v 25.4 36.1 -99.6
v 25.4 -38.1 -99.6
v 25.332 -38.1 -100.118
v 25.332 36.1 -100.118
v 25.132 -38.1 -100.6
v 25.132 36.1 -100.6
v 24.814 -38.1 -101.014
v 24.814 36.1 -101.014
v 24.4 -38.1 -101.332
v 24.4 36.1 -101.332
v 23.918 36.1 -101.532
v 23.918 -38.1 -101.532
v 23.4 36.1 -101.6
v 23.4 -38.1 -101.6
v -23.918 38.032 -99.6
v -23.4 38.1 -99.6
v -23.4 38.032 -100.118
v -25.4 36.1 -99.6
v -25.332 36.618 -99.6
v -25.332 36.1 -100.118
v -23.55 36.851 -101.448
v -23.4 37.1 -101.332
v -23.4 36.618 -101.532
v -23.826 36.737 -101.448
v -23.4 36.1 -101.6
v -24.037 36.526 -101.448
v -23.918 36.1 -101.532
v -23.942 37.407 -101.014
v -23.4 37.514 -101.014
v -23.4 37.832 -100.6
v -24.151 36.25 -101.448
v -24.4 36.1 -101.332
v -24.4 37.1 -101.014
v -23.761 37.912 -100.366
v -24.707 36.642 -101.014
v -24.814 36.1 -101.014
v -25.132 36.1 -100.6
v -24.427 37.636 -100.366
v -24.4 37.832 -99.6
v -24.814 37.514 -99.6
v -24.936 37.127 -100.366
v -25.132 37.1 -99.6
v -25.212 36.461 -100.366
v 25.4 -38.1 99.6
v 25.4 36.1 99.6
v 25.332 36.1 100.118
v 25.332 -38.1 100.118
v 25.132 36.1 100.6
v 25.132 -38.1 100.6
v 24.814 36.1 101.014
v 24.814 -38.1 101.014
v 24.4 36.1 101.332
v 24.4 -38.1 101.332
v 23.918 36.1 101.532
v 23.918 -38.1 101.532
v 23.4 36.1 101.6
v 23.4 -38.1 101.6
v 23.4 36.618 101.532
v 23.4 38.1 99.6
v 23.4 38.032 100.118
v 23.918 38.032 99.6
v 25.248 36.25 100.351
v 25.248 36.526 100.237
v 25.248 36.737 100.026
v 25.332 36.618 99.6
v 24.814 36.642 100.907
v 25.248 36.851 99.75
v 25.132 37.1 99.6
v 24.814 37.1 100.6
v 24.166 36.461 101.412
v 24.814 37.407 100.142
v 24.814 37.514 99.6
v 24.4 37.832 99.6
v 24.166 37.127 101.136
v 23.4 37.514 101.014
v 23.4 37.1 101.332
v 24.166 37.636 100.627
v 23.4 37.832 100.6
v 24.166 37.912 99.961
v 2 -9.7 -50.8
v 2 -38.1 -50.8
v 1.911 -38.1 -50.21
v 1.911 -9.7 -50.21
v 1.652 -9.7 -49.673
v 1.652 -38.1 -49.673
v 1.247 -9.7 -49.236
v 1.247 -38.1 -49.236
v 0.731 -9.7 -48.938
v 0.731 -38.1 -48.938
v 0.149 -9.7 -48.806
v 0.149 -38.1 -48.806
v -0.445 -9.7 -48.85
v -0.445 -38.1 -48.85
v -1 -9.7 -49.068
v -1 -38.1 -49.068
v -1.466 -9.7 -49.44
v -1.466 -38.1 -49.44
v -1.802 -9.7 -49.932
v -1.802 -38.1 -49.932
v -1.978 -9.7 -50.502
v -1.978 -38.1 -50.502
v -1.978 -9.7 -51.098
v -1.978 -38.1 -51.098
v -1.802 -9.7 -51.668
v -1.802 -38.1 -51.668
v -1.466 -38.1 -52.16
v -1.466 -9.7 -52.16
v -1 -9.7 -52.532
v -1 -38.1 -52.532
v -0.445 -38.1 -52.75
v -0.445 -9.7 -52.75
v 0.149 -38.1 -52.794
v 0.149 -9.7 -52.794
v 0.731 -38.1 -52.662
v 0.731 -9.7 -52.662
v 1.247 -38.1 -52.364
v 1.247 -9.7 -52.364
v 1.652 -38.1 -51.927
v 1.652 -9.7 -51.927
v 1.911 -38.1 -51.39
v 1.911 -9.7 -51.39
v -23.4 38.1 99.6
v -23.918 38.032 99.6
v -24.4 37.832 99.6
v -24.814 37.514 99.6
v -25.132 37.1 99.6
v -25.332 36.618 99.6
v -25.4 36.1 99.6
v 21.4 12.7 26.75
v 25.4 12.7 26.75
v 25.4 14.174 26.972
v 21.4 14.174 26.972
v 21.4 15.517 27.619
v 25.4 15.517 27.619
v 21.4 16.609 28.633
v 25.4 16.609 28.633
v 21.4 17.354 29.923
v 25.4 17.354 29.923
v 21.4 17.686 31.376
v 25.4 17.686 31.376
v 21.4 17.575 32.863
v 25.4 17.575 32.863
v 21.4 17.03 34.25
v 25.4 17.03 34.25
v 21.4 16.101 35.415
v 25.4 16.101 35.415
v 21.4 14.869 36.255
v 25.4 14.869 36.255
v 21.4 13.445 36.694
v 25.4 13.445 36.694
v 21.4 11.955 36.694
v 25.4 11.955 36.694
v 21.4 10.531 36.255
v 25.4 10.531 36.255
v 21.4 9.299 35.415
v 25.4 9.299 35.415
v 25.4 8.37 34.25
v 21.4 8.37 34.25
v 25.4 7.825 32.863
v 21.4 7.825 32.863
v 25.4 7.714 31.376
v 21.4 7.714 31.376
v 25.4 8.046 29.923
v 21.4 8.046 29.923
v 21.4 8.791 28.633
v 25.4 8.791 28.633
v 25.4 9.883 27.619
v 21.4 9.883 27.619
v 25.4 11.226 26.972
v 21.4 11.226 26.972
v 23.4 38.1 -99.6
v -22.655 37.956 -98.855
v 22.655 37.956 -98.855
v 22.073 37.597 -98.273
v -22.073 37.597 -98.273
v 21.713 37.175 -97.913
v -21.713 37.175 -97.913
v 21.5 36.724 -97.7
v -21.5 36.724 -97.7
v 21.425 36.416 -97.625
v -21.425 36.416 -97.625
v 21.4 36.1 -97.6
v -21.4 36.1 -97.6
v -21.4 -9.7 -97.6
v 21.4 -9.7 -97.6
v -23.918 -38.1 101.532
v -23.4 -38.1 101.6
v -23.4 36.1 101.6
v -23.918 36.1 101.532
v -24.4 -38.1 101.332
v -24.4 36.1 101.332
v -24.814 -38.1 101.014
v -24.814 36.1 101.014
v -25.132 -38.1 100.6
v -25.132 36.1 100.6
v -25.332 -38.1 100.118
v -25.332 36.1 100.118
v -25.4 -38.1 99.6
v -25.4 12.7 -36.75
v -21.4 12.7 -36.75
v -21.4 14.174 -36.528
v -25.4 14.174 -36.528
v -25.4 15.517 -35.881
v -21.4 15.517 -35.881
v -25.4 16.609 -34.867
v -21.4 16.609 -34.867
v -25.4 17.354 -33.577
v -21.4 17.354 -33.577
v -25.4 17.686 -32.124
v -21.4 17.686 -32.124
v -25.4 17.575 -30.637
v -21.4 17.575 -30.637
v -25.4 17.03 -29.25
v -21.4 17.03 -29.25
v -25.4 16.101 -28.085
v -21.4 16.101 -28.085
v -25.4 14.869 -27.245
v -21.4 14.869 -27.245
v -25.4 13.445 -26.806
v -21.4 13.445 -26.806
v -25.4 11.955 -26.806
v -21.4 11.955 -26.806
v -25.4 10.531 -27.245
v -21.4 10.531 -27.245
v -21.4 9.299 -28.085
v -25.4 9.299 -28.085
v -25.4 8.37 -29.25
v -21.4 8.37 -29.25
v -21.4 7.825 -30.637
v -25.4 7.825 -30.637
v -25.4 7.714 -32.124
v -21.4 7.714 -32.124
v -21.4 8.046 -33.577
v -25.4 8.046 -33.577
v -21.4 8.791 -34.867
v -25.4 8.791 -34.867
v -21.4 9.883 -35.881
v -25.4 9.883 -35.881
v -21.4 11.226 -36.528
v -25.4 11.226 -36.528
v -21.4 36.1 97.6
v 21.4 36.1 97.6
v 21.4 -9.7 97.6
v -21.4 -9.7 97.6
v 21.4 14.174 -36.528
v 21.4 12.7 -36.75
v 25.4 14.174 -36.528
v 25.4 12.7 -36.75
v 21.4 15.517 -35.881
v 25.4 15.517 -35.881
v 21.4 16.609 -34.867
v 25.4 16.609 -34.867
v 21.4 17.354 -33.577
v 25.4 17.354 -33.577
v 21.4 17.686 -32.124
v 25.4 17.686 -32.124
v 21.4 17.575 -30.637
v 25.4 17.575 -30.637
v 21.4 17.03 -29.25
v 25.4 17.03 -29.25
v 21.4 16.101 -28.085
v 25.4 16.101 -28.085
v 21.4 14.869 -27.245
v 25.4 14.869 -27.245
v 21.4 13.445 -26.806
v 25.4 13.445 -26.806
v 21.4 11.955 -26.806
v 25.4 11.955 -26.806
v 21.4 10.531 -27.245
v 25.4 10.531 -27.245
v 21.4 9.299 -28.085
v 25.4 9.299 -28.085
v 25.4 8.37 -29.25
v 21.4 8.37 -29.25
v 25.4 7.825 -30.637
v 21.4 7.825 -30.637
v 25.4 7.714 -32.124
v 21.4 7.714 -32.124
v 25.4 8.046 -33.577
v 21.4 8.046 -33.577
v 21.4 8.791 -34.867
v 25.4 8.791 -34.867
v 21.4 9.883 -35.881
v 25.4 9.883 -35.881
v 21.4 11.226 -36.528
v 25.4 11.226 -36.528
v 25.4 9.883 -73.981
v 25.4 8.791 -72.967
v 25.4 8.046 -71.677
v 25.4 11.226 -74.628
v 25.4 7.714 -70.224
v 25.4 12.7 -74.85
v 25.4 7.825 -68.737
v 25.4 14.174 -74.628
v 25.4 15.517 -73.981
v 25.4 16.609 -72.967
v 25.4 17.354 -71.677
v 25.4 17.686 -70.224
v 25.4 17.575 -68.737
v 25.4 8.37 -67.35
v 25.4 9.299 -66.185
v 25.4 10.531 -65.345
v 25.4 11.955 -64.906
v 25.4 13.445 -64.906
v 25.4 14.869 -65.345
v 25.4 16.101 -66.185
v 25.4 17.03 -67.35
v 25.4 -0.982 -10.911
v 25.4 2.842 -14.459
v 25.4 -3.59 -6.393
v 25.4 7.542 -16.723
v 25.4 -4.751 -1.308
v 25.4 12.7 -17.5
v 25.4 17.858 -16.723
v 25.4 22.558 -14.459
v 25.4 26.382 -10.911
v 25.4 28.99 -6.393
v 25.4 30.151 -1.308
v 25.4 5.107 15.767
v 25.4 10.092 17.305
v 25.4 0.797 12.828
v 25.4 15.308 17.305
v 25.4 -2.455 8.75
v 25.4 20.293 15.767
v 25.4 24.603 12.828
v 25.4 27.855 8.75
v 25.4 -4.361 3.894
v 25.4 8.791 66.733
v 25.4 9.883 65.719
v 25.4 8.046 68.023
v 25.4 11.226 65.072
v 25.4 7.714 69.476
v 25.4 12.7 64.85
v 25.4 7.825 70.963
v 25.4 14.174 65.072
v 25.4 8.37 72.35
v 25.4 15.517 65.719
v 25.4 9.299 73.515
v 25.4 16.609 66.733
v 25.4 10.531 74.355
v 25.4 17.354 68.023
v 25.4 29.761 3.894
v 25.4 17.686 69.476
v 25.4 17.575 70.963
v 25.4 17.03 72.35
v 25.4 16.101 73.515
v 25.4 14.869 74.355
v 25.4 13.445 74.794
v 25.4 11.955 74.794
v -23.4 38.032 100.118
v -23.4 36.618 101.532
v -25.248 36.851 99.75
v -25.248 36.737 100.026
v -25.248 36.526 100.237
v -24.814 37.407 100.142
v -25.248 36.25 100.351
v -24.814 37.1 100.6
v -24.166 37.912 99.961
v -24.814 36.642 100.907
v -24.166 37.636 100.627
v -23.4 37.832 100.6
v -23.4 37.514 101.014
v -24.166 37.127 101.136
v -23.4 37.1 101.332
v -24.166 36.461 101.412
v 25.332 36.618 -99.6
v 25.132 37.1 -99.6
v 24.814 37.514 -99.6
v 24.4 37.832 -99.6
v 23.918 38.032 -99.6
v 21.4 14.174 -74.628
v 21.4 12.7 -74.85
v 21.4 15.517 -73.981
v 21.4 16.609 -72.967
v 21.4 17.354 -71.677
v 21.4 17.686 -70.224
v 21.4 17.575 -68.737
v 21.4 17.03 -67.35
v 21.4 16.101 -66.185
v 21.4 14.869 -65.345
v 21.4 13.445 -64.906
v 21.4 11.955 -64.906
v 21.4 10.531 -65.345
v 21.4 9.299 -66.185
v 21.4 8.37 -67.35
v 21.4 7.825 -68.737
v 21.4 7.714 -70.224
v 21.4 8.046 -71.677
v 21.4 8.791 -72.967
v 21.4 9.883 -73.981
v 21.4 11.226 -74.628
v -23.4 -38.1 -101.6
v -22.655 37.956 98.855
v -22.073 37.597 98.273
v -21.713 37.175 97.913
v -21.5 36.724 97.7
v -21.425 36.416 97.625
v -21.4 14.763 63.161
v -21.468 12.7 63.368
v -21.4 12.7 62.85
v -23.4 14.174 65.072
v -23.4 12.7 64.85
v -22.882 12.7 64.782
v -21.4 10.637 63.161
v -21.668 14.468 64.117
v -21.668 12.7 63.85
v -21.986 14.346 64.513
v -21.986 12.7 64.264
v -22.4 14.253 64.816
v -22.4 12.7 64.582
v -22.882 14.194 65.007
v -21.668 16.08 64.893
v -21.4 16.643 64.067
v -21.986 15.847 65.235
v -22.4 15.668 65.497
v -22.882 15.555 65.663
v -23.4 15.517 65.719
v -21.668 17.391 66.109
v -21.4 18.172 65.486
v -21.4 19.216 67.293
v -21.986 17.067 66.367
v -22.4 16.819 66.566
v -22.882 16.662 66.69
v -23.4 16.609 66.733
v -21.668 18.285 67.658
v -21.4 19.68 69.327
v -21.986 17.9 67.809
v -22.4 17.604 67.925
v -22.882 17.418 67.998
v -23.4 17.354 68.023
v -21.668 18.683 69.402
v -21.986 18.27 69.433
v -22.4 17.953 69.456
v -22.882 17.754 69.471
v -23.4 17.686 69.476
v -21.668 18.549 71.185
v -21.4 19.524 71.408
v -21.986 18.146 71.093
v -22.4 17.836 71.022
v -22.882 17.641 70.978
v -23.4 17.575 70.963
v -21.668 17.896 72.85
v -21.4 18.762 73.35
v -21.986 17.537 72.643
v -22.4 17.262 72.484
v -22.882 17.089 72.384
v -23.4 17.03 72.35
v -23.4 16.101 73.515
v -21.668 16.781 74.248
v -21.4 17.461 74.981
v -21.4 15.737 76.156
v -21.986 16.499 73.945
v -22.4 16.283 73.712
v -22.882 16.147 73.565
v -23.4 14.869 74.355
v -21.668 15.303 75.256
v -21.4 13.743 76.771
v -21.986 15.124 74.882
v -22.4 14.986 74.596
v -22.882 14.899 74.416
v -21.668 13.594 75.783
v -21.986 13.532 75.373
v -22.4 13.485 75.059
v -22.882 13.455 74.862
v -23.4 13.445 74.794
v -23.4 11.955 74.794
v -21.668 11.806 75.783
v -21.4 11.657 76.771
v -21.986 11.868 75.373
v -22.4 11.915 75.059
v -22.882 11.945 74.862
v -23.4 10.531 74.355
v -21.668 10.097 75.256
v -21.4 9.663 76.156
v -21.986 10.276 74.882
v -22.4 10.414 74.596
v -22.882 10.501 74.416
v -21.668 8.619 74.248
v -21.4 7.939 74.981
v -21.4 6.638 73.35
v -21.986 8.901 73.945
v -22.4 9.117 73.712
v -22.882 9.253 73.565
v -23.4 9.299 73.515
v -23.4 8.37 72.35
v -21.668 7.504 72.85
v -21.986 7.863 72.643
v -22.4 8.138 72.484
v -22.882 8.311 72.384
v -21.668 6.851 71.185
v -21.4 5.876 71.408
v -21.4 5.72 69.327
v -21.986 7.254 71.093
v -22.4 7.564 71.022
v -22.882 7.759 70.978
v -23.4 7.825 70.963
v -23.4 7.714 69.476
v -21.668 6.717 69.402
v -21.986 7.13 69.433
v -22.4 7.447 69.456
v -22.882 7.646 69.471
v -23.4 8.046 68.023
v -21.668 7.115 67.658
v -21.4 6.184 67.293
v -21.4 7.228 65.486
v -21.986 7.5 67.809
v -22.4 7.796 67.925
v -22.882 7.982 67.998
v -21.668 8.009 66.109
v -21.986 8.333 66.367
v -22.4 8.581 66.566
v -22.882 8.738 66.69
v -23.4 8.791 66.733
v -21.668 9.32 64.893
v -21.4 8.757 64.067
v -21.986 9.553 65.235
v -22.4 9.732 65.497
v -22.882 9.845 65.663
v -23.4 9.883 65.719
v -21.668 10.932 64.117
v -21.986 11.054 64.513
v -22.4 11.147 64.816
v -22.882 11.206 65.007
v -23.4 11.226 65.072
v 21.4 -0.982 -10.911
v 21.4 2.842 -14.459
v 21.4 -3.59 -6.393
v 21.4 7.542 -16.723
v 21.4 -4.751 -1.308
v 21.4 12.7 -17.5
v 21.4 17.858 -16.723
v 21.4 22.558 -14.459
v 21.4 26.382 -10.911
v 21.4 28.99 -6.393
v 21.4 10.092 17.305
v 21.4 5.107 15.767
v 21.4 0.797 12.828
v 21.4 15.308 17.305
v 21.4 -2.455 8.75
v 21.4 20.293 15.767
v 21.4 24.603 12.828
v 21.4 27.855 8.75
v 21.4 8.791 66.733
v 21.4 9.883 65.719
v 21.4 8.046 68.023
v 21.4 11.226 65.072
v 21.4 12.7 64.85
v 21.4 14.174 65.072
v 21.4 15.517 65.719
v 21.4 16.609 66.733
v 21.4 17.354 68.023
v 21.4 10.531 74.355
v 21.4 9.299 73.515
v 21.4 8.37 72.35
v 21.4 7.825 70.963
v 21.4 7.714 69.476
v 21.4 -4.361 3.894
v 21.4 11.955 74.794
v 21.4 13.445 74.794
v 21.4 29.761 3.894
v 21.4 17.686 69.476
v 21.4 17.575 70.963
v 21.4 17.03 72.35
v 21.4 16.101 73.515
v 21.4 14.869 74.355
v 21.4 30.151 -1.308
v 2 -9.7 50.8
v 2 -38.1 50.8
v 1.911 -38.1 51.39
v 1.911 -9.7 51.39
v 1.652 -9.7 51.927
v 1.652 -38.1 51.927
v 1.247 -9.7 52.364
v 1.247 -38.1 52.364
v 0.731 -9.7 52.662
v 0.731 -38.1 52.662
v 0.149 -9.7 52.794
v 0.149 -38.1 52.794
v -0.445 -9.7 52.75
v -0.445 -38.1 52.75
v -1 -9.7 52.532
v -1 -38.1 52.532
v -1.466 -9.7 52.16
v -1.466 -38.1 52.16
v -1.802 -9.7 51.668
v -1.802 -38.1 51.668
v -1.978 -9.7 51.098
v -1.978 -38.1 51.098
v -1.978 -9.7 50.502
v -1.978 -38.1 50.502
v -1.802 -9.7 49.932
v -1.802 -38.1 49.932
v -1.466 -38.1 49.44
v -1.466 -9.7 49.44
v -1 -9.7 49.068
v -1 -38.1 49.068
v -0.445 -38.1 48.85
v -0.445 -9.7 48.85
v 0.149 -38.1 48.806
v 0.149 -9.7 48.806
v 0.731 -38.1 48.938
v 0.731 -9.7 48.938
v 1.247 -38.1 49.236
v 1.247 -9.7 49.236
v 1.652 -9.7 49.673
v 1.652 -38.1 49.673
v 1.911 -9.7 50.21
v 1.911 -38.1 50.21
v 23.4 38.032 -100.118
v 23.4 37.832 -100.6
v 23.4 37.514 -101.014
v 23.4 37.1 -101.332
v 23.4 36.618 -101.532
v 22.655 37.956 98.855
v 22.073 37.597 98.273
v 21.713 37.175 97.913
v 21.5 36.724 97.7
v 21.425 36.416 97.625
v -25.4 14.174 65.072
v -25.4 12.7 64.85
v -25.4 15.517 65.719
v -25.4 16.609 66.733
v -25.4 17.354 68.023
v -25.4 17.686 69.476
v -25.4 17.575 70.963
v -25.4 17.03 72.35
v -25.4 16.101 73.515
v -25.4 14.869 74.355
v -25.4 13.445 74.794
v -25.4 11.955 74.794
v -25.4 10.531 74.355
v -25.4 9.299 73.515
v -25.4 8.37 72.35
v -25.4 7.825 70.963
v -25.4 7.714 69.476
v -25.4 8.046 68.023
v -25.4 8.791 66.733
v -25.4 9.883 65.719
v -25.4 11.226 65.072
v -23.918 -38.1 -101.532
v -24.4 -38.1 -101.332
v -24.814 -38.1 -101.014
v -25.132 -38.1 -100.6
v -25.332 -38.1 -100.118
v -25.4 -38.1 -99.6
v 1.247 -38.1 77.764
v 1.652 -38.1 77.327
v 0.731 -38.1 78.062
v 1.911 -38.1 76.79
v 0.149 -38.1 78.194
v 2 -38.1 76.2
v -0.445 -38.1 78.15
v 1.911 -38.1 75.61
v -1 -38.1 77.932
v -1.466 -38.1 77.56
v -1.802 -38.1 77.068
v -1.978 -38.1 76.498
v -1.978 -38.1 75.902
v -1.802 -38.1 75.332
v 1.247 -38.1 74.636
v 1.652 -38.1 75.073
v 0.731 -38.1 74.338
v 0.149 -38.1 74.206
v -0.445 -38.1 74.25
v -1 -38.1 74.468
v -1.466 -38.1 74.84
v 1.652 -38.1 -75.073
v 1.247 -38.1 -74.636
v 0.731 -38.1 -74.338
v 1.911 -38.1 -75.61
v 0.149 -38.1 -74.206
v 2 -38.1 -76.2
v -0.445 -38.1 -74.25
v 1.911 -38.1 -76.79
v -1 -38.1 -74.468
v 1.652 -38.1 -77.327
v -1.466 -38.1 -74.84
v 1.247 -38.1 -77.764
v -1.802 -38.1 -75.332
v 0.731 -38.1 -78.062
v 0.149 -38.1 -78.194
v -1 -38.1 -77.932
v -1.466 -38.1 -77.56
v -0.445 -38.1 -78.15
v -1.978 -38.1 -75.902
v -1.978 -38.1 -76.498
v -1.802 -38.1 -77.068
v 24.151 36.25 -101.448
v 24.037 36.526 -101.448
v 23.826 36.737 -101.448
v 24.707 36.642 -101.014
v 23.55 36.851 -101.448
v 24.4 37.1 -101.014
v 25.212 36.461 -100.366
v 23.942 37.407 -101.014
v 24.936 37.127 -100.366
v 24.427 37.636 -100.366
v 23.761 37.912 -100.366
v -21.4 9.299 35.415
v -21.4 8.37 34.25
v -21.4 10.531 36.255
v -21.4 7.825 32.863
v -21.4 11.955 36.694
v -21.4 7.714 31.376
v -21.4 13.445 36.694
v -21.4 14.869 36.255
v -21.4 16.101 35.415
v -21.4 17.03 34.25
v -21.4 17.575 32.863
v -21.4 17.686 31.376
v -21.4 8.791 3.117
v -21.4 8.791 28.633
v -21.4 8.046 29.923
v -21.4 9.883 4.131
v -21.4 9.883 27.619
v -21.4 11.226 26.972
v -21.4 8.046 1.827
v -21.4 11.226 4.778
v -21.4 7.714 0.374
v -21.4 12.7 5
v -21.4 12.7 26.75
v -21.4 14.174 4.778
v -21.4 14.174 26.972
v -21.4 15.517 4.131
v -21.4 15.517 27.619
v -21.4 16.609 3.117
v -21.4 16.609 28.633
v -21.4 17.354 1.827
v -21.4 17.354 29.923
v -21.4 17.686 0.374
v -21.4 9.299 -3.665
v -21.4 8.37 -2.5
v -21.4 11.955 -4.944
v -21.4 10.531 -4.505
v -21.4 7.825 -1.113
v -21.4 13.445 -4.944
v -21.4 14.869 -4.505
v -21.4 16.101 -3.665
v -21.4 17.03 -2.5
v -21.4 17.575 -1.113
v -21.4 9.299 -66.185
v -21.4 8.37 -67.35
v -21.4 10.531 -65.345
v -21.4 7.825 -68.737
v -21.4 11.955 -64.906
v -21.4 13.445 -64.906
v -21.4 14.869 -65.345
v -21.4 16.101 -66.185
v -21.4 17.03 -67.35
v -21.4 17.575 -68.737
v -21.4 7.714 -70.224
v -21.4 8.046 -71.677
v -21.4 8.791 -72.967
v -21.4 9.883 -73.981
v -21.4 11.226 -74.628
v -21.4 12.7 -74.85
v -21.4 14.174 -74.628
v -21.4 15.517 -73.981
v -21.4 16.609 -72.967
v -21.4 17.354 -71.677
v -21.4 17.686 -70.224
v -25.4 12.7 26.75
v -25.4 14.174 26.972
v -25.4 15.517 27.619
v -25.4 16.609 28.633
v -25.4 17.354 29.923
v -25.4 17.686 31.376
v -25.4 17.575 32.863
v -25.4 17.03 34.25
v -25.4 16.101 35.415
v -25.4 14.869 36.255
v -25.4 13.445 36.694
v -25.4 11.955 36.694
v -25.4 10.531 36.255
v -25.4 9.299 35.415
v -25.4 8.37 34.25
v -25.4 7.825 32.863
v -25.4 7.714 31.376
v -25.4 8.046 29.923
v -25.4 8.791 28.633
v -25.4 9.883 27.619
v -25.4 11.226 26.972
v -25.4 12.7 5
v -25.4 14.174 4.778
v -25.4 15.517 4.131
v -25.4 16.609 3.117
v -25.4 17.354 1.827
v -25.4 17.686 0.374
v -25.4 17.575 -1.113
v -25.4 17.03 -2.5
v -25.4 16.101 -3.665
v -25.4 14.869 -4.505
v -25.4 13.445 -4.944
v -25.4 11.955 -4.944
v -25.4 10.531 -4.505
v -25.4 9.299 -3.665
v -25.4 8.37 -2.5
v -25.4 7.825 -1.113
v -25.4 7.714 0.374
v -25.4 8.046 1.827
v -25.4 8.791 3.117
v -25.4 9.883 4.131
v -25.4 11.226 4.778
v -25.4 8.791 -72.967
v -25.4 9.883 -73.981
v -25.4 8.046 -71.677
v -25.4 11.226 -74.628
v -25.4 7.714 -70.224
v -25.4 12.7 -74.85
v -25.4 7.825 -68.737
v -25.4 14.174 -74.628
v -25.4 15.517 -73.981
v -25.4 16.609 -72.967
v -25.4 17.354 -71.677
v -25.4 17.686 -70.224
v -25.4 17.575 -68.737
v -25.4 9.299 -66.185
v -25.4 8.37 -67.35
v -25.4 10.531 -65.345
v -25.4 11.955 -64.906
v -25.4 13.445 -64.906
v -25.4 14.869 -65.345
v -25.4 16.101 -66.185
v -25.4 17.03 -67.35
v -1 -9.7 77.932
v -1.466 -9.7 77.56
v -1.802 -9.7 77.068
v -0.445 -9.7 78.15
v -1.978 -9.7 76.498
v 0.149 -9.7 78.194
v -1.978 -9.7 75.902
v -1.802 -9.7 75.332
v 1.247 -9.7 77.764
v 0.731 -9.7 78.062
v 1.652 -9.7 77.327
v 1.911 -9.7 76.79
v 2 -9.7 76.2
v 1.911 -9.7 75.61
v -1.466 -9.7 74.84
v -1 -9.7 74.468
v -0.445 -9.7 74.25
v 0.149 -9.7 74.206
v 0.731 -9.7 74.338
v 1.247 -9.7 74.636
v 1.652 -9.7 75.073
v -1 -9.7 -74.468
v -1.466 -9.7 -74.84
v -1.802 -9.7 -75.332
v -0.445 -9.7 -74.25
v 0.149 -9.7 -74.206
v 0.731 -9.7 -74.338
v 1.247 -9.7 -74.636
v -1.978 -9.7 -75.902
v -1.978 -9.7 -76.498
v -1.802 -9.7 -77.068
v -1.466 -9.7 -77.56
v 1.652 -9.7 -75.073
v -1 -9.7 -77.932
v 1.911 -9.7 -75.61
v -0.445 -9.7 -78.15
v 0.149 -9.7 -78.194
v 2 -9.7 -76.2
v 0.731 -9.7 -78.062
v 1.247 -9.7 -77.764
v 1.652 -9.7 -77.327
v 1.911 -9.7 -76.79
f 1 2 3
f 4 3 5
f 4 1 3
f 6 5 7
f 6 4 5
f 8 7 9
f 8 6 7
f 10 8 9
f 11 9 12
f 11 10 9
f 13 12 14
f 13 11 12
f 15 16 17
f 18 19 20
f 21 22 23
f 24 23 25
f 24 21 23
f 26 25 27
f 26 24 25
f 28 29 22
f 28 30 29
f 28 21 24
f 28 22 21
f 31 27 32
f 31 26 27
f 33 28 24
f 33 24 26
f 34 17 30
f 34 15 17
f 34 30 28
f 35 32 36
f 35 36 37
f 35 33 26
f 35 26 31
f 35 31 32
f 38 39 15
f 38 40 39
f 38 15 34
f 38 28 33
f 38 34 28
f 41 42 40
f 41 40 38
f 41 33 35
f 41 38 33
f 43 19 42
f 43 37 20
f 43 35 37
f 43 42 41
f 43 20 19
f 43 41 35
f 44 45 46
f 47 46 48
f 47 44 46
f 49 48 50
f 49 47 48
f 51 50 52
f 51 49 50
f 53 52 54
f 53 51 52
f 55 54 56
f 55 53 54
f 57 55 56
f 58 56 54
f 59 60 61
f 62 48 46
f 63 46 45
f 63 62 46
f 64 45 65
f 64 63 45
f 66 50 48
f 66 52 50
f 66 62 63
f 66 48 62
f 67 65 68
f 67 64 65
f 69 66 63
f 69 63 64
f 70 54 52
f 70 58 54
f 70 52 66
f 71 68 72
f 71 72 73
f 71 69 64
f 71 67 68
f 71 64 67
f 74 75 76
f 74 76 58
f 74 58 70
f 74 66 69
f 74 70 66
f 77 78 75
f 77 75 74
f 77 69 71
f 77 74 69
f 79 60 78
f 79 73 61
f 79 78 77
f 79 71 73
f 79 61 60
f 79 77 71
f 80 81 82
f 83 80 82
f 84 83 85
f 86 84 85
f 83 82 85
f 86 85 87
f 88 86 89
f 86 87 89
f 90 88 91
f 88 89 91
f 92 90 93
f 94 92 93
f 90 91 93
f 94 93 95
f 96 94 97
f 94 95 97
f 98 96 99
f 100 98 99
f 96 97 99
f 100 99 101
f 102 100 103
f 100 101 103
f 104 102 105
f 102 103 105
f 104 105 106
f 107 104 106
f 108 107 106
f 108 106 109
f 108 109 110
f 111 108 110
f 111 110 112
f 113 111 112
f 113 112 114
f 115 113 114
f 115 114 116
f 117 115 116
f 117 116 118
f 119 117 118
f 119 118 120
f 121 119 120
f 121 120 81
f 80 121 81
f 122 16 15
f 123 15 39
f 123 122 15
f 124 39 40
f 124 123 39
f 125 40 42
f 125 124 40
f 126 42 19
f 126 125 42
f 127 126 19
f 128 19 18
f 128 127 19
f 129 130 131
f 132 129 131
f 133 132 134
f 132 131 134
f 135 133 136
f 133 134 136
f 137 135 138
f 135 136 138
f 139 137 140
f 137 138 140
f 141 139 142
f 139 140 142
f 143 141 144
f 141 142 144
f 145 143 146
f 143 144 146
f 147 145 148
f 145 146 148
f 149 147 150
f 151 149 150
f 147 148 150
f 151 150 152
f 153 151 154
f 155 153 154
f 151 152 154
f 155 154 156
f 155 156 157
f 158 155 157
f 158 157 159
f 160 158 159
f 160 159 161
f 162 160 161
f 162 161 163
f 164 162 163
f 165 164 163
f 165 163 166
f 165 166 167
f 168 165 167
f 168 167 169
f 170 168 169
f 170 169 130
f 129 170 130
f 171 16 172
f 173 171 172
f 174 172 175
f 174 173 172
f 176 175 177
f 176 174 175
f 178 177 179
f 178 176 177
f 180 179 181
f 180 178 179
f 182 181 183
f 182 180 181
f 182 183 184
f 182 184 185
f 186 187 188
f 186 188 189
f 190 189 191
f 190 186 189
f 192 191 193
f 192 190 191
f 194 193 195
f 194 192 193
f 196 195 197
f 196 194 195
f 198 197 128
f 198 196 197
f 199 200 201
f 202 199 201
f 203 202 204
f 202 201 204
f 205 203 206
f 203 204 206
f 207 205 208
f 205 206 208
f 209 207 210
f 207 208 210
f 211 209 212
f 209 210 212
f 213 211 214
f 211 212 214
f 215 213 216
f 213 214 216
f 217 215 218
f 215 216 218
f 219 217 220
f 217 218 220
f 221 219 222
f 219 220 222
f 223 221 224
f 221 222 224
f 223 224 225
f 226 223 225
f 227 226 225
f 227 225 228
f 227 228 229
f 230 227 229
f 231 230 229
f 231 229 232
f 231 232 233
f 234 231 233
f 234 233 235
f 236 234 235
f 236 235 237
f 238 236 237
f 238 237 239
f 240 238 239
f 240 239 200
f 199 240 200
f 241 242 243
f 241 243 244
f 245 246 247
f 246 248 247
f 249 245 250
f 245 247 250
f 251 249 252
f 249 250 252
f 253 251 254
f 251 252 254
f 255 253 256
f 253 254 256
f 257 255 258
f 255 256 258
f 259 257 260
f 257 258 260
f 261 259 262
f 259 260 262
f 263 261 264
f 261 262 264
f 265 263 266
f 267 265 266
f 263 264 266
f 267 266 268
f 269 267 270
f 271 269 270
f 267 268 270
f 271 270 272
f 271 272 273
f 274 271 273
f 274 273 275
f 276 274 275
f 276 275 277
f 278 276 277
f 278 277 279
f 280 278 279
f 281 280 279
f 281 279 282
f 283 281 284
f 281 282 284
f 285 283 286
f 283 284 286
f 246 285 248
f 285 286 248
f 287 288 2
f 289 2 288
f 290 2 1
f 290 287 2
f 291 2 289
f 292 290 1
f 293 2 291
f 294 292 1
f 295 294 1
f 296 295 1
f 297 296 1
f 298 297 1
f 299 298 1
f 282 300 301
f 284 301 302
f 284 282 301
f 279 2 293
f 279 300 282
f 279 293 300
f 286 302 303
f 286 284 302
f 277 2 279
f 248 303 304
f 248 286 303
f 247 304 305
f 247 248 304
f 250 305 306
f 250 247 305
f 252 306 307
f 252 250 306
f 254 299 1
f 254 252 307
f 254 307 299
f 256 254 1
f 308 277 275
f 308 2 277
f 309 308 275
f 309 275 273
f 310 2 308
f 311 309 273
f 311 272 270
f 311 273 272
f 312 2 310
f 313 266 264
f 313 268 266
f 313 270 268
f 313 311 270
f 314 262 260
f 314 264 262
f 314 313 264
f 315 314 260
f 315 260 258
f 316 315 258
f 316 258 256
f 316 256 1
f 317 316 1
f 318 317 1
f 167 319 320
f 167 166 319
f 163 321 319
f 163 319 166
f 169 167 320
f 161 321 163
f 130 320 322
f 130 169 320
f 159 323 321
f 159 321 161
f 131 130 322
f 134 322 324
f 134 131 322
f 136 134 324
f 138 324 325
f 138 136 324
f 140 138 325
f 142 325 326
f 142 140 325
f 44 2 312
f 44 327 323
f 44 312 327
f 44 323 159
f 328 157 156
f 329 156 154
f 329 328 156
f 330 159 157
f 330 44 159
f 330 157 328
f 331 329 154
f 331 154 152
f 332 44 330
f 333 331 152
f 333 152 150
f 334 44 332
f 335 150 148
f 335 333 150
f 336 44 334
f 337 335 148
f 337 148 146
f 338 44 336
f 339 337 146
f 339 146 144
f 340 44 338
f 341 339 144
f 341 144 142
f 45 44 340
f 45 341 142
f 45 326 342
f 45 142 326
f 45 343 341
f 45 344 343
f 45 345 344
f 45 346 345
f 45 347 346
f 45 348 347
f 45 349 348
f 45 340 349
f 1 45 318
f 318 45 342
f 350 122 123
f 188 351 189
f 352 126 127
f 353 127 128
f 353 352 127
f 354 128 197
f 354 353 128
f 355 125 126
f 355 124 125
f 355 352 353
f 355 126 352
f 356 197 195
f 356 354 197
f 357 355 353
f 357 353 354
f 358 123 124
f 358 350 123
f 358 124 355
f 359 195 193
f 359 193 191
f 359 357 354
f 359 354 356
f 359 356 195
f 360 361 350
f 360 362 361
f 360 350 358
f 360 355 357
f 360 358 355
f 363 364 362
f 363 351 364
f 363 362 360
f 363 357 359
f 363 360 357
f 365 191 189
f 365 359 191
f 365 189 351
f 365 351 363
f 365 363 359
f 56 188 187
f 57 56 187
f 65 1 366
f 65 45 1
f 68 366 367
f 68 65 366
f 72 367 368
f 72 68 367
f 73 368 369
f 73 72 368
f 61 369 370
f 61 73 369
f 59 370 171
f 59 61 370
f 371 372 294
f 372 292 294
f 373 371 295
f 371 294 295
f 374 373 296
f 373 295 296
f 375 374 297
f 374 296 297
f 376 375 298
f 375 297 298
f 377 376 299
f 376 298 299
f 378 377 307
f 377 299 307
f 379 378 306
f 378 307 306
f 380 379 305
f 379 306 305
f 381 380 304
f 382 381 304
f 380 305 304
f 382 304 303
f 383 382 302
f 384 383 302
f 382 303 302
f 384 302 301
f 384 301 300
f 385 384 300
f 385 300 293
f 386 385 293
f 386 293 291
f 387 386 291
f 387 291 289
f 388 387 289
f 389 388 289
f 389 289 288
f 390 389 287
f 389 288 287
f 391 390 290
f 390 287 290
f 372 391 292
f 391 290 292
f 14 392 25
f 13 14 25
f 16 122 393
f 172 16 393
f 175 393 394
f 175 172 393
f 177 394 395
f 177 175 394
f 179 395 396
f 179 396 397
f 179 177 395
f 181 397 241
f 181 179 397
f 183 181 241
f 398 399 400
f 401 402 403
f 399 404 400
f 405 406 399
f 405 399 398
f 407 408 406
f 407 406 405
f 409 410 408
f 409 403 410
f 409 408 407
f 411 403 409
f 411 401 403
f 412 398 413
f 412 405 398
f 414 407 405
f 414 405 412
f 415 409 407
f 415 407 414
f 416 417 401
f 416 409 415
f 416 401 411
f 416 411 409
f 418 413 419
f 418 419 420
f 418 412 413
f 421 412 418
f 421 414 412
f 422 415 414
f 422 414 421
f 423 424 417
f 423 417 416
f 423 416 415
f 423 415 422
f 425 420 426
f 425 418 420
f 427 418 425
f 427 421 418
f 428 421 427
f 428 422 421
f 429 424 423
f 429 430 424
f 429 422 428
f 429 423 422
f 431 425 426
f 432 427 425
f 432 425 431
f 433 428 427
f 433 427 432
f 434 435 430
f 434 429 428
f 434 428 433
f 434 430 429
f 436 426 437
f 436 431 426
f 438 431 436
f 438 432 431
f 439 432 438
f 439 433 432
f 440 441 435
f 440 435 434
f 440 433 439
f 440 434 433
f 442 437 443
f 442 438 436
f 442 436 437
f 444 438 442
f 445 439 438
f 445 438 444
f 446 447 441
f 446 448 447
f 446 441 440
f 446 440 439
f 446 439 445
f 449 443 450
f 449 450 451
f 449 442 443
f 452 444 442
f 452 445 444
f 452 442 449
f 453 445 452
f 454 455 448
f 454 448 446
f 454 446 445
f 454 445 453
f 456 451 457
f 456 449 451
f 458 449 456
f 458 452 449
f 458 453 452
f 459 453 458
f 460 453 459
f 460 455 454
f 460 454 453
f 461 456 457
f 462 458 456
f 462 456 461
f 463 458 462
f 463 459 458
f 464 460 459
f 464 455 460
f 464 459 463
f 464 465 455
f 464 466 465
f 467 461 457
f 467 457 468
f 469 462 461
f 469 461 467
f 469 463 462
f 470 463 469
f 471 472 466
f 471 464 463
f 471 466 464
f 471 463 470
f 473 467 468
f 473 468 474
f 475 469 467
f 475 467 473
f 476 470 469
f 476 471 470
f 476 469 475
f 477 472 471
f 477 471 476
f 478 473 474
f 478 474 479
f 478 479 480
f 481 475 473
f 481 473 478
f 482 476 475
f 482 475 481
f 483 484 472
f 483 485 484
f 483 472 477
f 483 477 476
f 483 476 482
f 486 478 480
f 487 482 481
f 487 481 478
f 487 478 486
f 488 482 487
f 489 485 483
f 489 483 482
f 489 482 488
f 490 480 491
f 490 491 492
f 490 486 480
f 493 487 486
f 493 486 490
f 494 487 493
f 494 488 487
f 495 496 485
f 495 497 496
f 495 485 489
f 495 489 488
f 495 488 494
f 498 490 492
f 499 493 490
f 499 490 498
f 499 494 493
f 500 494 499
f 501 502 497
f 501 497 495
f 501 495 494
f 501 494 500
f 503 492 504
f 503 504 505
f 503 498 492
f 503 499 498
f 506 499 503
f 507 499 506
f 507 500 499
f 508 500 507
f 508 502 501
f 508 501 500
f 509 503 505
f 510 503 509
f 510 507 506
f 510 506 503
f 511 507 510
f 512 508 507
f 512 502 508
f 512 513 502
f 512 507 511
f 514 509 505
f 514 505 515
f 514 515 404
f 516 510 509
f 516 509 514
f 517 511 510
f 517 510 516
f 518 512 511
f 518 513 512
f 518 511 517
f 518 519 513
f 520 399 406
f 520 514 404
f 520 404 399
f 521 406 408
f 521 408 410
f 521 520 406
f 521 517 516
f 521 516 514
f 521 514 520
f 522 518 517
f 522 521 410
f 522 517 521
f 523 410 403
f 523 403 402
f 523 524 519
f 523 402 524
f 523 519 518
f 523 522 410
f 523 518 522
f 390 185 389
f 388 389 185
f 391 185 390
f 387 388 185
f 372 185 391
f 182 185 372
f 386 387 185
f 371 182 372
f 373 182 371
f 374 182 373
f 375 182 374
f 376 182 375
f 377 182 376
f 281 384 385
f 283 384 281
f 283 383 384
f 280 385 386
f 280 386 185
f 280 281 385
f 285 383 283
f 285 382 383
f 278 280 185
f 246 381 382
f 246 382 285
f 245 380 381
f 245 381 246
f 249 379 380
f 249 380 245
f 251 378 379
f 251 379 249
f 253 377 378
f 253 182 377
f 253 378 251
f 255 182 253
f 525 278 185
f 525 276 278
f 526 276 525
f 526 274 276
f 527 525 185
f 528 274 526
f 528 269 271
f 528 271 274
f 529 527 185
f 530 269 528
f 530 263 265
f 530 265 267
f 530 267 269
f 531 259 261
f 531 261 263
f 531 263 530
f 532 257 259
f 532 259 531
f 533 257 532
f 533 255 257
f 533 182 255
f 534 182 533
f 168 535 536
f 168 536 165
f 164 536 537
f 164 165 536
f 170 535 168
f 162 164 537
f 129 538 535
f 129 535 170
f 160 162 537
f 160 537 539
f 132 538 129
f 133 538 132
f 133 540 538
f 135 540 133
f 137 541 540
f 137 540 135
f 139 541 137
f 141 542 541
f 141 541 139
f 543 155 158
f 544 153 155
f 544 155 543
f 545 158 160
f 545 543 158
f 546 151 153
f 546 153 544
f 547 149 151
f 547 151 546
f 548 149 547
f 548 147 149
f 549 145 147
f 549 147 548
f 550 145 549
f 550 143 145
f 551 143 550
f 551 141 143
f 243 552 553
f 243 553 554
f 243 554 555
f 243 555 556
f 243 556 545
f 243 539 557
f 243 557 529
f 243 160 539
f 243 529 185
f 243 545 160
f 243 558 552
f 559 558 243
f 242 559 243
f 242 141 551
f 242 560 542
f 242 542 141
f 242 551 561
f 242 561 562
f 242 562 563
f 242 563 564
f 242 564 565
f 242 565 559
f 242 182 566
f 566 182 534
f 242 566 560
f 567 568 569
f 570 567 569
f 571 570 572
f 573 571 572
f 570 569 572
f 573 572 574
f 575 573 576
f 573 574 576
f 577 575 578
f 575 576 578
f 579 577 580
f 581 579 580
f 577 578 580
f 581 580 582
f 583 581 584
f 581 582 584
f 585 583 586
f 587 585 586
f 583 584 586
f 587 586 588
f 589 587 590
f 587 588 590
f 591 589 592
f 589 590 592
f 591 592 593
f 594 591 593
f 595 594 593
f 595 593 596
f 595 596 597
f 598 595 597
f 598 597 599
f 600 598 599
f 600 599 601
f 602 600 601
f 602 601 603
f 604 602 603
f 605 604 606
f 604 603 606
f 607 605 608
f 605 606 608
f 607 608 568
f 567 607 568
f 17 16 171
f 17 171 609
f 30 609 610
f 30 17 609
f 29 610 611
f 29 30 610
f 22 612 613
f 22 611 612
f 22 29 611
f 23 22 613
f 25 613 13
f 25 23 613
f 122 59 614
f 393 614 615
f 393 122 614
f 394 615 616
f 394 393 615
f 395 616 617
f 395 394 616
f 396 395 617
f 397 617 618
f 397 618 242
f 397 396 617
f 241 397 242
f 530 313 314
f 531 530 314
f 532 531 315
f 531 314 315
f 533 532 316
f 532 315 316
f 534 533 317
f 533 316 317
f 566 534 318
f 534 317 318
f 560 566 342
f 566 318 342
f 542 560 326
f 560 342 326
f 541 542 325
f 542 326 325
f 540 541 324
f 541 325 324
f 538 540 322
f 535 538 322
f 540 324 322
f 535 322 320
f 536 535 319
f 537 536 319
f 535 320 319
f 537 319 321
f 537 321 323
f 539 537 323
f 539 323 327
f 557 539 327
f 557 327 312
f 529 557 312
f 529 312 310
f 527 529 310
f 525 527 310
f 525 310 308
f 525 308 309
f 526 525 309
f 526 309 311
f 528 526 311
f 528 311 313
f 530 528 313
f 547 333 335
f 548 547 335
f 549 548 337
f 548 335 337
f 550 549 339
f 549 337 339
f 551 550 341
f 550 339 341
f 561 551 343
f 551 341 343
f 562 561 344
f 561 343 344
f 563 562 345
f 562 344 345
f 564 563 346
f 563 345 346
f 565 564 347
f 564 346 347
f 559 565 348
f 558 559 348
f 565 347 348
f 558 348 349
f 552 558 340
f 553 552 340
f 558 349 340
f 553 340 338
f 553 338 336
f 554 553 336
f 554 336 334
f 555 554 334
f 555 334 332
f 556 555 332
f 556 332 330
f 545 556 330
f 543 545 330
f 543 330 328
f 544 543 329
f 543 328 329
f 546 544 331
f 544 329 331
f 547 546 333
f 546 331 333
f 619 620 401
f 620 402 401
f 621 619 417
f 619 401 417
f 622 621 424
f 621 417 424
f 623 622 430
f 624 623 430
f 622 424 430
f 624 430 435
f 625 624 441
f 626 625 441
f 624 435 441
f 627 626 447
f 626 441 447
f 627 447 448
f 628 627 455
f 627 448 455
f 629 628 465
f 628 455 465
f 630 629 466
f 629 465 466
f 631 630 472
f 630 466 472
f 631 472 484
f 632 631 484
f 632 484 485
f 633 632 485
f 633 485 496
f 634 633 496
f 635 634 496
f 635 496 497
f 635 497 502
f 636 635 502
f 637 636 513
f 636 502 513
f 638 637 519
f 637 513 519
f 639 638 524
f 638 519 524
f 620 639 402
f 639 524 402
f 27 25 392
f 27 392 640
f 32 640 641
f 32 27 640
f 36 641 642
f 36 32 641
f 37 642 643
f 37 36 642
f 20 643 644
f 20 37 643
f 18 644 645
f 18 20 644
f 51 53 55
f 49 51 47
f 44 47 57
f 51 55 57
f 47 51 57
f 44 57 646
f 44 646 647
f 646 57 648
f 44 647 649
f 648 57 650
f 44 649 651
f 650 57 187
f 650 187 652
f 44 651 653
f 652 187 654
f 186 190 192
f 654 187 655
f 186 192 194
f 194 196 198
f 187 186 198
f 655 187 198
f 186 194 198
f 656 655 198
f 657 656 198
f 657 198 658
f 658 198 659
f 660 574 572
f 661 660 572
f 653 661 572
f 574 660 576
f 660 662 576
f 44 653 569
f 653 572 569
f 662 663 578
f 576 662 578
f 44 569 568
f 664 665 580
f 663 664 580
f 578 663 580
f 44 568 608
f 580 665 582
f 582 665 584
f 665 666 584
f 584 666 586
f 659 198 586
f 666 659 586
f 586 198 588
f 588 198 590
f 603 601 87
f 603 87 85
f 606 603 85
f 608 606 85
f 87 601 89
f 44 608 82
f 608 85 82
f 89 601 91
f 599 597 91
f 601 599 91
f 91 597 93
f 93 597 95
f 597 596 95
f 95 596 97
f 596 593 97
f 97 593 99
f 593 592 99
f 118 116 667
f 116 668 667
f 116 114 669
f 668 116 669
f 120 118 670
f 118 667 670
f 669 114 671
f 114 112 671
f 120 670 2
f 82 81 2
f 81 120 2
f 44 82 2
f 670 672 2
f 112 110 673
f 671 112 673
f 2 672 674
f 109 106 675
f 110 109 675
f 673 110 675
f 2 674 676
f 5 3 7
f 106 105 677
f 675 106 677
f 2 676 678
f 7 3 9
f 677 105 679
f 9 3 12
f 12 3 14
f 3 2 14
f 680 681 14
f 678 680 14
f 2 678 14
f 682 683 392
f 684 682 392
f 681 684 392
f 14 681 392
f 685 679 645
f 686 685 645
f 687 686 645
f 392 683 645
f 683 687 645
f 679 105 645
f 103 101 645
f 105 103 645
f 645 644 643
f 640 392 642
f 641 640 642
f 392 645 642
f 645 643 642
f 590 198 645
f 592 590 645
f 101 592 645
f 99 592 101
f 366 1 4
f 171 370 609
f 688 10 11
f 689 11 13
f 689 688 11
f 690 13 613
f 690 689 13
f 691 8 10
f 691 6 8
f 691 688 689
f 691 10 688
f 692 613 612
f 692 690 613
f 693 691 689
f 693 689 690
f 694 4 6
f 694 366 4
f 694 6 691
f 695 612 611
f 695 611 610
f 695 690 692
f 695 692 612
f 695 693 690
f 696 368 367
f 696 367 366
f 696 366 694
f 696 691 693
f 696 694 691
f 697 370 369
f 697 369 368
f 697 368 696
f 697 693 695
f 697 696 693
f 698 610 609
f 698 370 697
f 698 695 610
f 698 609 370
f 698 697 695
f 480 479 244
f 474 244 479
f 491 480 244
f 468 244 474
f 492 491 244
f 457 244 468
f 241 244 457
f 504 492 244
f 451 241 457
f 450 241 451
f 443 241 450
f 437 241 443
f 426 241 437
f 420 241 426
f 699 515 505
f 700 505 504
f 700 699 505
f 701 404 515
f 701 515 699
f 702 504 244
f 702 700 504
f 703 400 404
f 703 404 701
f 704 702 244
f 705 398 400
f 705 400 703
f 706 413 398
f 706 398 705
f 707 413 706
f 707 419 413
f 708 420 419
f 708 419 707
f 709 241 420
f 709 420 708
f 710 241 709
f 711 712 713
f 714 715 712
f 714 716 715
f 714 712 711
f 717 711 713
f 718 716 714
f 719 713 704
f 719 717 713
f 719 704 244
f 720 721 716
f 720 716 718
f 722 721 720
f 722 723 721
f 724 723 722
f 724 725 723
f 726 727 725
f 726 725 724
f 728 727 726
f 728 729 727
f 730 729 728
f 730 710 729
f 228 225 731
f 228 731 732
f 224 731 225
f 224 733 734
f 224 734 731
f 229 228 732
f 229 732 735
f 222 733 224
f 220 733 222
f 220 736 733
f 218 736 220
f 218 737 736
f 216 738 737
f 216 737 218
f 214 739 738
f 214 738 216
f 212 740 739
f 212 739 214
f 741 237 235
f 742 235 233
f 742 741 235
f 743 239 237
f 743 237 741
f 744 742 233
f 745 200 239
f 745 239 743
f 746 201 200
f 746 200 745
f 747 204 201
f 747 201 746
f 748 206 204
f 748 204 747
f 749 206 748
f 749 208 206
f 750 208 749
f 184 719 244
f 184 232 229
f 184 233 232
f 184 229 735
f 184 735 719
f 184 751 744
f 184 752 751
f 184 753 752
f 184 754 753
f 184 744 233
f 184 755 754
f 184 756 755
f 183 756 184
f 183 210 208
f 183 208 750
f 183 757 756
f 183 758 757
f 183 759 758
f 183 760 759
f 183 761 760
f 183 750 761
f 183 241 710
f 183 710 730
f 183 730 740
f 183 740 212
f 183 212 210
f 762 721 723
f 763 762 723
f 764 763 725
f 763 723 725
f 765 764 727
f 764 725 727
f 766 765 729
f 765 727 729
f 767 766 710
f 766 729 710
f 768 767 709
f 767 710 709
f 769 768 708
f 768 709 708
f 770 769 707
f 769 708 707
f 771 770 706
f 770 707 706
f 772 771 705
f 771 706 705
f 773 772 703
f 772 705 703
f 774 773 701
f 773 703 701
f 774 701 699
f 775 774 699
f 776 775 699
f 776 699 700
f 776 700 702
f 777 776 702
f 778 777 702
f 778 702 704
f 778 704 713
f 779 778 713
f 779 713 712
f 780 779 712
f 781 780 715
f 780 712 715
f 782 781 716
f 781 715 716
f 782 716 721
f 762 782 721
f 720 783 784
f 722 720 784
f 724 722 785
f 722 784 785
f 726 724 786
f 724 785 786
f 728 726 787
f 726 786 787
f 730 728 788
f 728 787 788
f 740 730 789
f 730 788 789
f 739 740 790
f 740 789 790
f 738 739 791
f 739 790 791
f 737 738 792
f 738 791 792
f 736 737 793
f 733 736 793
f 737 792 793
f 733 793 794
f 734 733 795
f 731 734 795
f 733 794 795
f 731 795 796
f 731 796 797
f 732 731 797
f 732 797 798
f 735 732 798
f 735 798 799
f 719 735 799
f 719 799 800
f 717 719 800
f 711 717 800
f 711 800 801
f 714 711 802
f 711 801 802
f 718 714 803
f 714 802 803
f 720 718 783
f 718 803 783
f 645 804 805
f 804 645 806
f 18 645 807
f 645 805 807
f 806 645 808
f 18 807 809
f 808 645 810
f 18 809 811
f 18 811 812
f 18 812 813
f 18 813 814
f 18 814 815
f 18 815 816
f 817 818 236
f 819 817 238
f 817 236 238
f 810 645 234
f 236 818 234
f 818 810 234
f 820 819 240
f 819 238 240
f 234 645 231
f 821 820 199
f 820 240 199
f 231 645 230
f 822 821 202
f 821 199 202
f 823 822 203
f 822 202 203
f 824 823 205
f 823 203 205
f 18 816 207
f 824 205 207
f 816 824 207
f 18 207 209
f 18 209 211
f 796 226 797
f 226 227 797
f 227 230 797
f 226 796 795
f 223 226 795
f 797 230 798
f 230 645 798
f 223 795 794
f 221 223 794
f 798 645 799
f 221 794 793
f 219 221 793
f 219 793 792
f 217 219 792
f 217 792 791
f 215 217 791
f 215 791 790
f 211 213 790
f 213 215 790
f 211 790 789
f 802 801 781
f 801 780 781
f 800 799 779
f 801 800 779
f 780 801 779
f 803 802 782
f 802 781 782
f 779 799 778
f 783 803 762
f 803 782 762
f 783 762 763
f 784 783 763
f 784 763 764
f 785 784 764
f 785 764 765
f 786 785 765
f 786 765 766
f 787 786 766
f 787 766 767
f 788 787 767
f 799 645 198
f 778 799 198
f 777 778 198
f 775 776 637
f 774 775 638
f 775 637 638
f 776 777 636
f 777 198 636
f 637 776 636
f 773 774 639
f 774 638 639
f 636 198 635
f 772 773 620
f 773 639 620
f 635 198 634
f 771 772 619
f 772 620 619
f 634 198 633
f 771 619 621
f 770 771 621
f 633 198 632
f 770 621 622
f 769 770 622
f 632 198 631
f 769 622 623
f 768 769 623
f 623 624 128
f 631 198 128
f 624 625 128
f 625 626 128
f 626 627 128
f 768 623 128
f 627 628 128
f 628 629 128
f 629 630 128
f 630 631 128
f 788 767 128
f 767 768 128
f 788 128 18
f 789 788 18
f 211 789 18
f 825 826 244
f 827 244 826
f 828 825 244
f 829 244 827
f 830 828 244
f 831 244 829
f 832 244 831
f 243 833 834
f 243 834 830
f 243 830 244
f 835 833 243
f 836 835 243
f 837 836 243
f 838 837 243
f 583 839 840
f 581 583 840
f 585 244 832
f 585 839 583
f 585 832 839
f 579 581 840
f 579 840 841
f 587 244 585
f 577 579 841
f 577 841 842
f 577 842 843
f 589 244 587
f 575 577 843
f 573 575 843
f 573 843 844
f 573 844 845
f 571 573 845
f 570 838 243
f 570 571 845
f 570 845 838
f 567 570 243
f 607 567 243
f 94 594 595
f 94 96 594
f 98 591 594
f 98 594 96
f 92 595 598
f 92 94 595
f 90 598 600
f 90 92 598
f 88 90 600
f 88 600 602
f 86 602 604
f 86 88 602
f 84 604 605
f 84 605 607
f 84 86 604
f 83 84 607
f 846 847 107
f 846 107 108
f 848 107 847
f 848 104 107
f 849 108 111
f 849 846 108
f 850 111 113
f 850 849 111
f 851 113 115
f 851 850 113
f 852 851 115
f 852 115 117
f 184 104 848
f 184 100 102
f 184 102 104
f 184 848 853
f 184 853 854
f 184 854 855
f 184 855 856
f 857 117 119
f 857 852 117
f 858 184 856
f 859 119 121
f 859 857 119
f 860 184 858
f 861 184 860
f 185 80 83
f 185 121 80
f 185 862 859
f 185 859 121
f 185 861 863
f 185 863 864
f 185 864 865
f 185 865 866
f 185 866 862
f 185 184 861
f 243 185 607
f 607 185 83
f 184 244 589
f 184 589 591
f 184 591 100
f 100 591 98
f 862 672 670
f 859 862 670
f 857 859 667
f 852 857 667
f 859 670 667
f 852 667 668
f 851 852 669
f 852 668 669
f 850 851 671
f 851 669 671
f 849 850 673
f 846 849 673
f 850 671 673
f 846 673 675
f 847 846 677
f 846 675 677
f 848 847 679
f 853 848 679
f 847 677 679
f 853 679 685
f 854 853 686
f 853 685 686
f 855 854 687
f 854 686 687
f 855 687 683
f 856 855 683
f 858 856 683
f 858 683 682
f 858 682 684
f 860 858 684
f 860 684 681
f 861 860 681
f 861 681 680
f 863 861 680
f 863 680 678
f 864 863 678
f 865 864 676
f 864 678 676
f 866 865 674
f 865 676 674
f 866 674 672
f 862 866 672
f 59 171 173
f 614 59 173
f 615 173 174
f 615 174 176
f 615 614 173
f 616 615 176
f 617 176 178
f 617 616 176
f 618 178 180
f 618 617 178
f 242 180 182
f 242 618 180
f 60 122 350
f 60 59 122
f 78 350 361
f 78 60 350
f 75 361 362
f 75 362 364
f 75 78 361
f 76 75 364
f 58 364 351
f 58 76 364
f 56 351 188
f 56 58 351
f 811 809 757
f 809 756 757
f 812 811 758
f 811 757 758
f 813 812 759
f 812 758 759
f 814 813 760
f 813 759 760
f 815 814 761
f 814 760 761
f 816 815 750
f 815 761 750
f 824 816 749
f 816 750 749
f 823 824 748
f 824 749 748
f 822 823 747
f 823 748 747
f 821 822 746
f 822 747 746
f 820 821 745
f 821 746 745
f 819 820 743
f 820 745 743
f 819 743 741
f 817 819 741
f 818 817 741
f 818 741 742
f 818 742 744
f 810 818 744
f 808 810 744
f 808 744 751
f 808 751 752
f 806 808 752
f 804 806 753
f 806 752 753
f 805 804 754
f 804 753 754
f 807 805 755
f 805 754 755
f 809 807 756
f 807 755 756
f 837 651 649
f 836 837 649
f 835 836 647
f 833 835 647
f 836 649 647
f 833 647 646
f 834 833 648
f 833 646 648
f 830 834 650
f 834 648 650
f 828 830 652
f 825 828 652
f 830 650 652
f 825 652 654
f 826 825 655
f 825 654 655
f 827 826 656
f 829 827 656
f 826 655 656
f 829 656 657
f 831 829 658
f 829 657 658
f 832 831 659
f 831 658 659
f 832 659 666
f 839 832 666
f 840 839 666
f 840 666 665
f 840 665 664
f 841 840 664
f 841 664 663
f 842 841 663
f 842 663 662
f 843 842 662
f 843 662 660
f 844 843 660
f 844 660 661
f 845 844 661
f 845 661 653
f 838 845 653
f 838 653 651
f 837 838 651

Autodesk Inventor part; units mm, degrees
ref_plane "YZ Plane" through (0, 0, 0) normal (1, 0, 0) x (0, 1, 0)
ref_plane "XZ Plane" through (0, 0, 0) normal (0, 1, 0) x (-1, 0, 0)
ref_plane "XY Plane" through (0, 0, 0) normal (0, 0, 1) x (1, 0, 0)
sketch "Sketch1" plane through (0, 0, 0) normal (1, 0, 0) x (0, 1, 0)
  line L0 (38.1, 101.6) -> (-38.1, 101.6)
  line L1 (-38.1, 101.6) -> (-38.1, -101.6)
  line L2 (-38.1, -101.6) -> (38.1, -101.6)
  line L3 (38.1, -101.6) -> (38.1, 101.6)
  line L4 (38.1, 101.6) -> (-38.1, -101.6) construction
  line L5 (-38.1, 101.6) -> (38.1, -101.6) construction
  point P0 (0, 0)
  dimension "d0" = 76.2
  dimension "d1" = 203.2
extrude "Extrusion1" add sketch "Sketch1" along normal mid plane 50.8
sketch "Sketch2" plane through (-25.4, 38.1, 101.6) normal (0, 1, 0) x (1, 0, 0)
  line L0 (4, 199.2) -> (46.8, 199.2)
  line L1 (46.8, 199.2) -> (46.8, 4)
  line L2 (46.8, 4) -> (4, 4)
  line L3 (4, 4) -> (4, 199.2)
  line L4 (4, 199.2) -> (46.8, 4) construction
  line L5 (46.8, 199.2) -> (4, 4) construction
  line L6 (0, 0) -> (0, 203.2) projected
  line L7 (0, 0) -> (50.8, 0) projected
  point P0 (25.4, 101.6)
  dimension "d4" = 4
  dimension "d5" = 4
extrude "Extrusion2" cut sketch "Sketch2" against normal blind 47.8
sketch "Sketch5" plane through (-25.4, -38.1, -101.6) normal (0, -1, 0) x (1, 0, 0)
  circle A0 centre (25.4, 152.4) radius 2
  circle A1 centre (25.4, 177.8) radius 2
  circle A2 centre (25.4, 50.8) radius 2
  circle A3 centre (25.4, 25.4) radius 2
  line L0 (50.8, 203.2) -> (0, 203.2) projected
  line L1 (0, 0) -> (50.8, 0) projected
  line L2 (50.8, 203.2) -> (50.8, 0) projected
  point P0 (25.4, 101.6)
  dimension "d33" = 4
  dimension "d34" = 4
  dimension "d35" = 4
  dimension "d36" = 4
  dimension "d37" = 25.4
  dimension "d38" = 25.4
  dimension "d39" = 50.8
  dimension "d40" = 50.8
  dimension "d41" = 25.4
  dimension "d42" = 25.4
  dimension "d43" = 25.4
  dimension "d44" = 25.4
extrude "Extrusion5" cut sketch "Sketch5" against normal through all
sketch "Sketch6" plane through (25.4, 0, 0) normal (1, 0, 0) x (0, 0, -1)
  point P0 (0, 0)
sketch "Sketch7" plane through (25.4, 0, 0) normal (1, 0, 0) x (0, 0, -1)
  point P0 (0, 0)
sketch "Sketch8" plane through (25.4, 0, 0) normal (1, 0, 0) x (0, 0, -1)
  circle A0 centre (-69.85, 12.7) radius 5
  circle A1 centre (-31.75, 12.7) radius 5
  circle A2 centre (31.75, 12.7) radius 5
  circle A3 centre (69.85, 12.7) radius 5
  line L0 (-101.6, 38.1) -> (-101.6, -38.1)
  line L1 (101.6, -38.1) -> (101.6, 38.1)
  line L2 (101.6, 38.1) -> (-101.6, 38.1) projected
  point P0 (0, 0)
  dimension "d47" = 10
  dimension "d48" = 10
  dimension "d49" = 10
  dimension "d50" = 10
  dimension "d51" = 31.75
  dimension "d52" = 69.85
  dimension "d53" = 31.75
  dimension "d54" = 69.85
  dimension "d55" = 25.4
  dimension "d56" = 25.4
  dimension "d57" = 25.4
  dimension "d58" = 25.4
sketch "Sketch9" plane through (25.4, 0, 0) normal (1, 0, 0) x (0, 0, -1)
  point P0 (0, 0)
sketch "Sketch10" plane through (25.4, 0, 0) normal (1, 0, 0) x (0, 0, -1)
  point P0 (0, 0)
extrude "Extrusion6" cut sketch "Sketch8" against normal through all
fillet "Fillet1" radius 2 13 edges at (0, 38.1, 101.6) (0, 38.1, 97.6) (-21.4, 12.7, 74.85) (25.4, 38.1, 0) (21.4, 38.1, 0) (-21.4, 38.1, 0) (-25.4, 38.1, 0) (0, 38.1, -97.6) (0, 38.1, -101.6) (25.4, 0, 101.6) (-25.4, 0, 101.6) (25.4, 0, -101.6) (-25.4, 0, -101.6)
sketch "Sketch11" plane through (0, 0, 0) normal (0, 1, 0) x (-1, 0, 0)
  point P0 (0, 0)
sketch "Sketch12" plane through (0, 0, 0) normal (0, 1, 0) x (-1, 0, 0)
  point P0 (0, 0)
sketch "Sketch13" plane through (-25.4, 0, 0) normal (-1, 0, 0) x (0, 0, 1)
  circle A0 centre (0, 12.7) radius 5
  line L0 (-99.6, -38.1) -> (99.6, -38.1) projected
  point P0 (0, 0)
  dimension "d62" = 10
  dimension "d63" = 50.8
extrude "Extrusion7" cut sketch "Sketch13" against normal blind 4
sketch "Sketch14" plane through (25.4, 0, 0) normal (1, 0, 0) x (0, 0, -1)
  circle A0 centre (0, 12.7) radius 17.5
  line L0 (-99.6, 36.1) -> (99.6, 36.1) projected
  point P0 (0, 0)
  dimension "d66" = 35
  dimension "d69" = 23.4
extrude "Extrusion8" cut sketch "Sketch14" against normal blind 4
sketch "Sketch15" plane through (25.4, 0, 0) normal (1, 0, 0) x (0, 0, -1)
  point P0 (0, 0)
properties part number "gear holder" material "Stainless Steel"
